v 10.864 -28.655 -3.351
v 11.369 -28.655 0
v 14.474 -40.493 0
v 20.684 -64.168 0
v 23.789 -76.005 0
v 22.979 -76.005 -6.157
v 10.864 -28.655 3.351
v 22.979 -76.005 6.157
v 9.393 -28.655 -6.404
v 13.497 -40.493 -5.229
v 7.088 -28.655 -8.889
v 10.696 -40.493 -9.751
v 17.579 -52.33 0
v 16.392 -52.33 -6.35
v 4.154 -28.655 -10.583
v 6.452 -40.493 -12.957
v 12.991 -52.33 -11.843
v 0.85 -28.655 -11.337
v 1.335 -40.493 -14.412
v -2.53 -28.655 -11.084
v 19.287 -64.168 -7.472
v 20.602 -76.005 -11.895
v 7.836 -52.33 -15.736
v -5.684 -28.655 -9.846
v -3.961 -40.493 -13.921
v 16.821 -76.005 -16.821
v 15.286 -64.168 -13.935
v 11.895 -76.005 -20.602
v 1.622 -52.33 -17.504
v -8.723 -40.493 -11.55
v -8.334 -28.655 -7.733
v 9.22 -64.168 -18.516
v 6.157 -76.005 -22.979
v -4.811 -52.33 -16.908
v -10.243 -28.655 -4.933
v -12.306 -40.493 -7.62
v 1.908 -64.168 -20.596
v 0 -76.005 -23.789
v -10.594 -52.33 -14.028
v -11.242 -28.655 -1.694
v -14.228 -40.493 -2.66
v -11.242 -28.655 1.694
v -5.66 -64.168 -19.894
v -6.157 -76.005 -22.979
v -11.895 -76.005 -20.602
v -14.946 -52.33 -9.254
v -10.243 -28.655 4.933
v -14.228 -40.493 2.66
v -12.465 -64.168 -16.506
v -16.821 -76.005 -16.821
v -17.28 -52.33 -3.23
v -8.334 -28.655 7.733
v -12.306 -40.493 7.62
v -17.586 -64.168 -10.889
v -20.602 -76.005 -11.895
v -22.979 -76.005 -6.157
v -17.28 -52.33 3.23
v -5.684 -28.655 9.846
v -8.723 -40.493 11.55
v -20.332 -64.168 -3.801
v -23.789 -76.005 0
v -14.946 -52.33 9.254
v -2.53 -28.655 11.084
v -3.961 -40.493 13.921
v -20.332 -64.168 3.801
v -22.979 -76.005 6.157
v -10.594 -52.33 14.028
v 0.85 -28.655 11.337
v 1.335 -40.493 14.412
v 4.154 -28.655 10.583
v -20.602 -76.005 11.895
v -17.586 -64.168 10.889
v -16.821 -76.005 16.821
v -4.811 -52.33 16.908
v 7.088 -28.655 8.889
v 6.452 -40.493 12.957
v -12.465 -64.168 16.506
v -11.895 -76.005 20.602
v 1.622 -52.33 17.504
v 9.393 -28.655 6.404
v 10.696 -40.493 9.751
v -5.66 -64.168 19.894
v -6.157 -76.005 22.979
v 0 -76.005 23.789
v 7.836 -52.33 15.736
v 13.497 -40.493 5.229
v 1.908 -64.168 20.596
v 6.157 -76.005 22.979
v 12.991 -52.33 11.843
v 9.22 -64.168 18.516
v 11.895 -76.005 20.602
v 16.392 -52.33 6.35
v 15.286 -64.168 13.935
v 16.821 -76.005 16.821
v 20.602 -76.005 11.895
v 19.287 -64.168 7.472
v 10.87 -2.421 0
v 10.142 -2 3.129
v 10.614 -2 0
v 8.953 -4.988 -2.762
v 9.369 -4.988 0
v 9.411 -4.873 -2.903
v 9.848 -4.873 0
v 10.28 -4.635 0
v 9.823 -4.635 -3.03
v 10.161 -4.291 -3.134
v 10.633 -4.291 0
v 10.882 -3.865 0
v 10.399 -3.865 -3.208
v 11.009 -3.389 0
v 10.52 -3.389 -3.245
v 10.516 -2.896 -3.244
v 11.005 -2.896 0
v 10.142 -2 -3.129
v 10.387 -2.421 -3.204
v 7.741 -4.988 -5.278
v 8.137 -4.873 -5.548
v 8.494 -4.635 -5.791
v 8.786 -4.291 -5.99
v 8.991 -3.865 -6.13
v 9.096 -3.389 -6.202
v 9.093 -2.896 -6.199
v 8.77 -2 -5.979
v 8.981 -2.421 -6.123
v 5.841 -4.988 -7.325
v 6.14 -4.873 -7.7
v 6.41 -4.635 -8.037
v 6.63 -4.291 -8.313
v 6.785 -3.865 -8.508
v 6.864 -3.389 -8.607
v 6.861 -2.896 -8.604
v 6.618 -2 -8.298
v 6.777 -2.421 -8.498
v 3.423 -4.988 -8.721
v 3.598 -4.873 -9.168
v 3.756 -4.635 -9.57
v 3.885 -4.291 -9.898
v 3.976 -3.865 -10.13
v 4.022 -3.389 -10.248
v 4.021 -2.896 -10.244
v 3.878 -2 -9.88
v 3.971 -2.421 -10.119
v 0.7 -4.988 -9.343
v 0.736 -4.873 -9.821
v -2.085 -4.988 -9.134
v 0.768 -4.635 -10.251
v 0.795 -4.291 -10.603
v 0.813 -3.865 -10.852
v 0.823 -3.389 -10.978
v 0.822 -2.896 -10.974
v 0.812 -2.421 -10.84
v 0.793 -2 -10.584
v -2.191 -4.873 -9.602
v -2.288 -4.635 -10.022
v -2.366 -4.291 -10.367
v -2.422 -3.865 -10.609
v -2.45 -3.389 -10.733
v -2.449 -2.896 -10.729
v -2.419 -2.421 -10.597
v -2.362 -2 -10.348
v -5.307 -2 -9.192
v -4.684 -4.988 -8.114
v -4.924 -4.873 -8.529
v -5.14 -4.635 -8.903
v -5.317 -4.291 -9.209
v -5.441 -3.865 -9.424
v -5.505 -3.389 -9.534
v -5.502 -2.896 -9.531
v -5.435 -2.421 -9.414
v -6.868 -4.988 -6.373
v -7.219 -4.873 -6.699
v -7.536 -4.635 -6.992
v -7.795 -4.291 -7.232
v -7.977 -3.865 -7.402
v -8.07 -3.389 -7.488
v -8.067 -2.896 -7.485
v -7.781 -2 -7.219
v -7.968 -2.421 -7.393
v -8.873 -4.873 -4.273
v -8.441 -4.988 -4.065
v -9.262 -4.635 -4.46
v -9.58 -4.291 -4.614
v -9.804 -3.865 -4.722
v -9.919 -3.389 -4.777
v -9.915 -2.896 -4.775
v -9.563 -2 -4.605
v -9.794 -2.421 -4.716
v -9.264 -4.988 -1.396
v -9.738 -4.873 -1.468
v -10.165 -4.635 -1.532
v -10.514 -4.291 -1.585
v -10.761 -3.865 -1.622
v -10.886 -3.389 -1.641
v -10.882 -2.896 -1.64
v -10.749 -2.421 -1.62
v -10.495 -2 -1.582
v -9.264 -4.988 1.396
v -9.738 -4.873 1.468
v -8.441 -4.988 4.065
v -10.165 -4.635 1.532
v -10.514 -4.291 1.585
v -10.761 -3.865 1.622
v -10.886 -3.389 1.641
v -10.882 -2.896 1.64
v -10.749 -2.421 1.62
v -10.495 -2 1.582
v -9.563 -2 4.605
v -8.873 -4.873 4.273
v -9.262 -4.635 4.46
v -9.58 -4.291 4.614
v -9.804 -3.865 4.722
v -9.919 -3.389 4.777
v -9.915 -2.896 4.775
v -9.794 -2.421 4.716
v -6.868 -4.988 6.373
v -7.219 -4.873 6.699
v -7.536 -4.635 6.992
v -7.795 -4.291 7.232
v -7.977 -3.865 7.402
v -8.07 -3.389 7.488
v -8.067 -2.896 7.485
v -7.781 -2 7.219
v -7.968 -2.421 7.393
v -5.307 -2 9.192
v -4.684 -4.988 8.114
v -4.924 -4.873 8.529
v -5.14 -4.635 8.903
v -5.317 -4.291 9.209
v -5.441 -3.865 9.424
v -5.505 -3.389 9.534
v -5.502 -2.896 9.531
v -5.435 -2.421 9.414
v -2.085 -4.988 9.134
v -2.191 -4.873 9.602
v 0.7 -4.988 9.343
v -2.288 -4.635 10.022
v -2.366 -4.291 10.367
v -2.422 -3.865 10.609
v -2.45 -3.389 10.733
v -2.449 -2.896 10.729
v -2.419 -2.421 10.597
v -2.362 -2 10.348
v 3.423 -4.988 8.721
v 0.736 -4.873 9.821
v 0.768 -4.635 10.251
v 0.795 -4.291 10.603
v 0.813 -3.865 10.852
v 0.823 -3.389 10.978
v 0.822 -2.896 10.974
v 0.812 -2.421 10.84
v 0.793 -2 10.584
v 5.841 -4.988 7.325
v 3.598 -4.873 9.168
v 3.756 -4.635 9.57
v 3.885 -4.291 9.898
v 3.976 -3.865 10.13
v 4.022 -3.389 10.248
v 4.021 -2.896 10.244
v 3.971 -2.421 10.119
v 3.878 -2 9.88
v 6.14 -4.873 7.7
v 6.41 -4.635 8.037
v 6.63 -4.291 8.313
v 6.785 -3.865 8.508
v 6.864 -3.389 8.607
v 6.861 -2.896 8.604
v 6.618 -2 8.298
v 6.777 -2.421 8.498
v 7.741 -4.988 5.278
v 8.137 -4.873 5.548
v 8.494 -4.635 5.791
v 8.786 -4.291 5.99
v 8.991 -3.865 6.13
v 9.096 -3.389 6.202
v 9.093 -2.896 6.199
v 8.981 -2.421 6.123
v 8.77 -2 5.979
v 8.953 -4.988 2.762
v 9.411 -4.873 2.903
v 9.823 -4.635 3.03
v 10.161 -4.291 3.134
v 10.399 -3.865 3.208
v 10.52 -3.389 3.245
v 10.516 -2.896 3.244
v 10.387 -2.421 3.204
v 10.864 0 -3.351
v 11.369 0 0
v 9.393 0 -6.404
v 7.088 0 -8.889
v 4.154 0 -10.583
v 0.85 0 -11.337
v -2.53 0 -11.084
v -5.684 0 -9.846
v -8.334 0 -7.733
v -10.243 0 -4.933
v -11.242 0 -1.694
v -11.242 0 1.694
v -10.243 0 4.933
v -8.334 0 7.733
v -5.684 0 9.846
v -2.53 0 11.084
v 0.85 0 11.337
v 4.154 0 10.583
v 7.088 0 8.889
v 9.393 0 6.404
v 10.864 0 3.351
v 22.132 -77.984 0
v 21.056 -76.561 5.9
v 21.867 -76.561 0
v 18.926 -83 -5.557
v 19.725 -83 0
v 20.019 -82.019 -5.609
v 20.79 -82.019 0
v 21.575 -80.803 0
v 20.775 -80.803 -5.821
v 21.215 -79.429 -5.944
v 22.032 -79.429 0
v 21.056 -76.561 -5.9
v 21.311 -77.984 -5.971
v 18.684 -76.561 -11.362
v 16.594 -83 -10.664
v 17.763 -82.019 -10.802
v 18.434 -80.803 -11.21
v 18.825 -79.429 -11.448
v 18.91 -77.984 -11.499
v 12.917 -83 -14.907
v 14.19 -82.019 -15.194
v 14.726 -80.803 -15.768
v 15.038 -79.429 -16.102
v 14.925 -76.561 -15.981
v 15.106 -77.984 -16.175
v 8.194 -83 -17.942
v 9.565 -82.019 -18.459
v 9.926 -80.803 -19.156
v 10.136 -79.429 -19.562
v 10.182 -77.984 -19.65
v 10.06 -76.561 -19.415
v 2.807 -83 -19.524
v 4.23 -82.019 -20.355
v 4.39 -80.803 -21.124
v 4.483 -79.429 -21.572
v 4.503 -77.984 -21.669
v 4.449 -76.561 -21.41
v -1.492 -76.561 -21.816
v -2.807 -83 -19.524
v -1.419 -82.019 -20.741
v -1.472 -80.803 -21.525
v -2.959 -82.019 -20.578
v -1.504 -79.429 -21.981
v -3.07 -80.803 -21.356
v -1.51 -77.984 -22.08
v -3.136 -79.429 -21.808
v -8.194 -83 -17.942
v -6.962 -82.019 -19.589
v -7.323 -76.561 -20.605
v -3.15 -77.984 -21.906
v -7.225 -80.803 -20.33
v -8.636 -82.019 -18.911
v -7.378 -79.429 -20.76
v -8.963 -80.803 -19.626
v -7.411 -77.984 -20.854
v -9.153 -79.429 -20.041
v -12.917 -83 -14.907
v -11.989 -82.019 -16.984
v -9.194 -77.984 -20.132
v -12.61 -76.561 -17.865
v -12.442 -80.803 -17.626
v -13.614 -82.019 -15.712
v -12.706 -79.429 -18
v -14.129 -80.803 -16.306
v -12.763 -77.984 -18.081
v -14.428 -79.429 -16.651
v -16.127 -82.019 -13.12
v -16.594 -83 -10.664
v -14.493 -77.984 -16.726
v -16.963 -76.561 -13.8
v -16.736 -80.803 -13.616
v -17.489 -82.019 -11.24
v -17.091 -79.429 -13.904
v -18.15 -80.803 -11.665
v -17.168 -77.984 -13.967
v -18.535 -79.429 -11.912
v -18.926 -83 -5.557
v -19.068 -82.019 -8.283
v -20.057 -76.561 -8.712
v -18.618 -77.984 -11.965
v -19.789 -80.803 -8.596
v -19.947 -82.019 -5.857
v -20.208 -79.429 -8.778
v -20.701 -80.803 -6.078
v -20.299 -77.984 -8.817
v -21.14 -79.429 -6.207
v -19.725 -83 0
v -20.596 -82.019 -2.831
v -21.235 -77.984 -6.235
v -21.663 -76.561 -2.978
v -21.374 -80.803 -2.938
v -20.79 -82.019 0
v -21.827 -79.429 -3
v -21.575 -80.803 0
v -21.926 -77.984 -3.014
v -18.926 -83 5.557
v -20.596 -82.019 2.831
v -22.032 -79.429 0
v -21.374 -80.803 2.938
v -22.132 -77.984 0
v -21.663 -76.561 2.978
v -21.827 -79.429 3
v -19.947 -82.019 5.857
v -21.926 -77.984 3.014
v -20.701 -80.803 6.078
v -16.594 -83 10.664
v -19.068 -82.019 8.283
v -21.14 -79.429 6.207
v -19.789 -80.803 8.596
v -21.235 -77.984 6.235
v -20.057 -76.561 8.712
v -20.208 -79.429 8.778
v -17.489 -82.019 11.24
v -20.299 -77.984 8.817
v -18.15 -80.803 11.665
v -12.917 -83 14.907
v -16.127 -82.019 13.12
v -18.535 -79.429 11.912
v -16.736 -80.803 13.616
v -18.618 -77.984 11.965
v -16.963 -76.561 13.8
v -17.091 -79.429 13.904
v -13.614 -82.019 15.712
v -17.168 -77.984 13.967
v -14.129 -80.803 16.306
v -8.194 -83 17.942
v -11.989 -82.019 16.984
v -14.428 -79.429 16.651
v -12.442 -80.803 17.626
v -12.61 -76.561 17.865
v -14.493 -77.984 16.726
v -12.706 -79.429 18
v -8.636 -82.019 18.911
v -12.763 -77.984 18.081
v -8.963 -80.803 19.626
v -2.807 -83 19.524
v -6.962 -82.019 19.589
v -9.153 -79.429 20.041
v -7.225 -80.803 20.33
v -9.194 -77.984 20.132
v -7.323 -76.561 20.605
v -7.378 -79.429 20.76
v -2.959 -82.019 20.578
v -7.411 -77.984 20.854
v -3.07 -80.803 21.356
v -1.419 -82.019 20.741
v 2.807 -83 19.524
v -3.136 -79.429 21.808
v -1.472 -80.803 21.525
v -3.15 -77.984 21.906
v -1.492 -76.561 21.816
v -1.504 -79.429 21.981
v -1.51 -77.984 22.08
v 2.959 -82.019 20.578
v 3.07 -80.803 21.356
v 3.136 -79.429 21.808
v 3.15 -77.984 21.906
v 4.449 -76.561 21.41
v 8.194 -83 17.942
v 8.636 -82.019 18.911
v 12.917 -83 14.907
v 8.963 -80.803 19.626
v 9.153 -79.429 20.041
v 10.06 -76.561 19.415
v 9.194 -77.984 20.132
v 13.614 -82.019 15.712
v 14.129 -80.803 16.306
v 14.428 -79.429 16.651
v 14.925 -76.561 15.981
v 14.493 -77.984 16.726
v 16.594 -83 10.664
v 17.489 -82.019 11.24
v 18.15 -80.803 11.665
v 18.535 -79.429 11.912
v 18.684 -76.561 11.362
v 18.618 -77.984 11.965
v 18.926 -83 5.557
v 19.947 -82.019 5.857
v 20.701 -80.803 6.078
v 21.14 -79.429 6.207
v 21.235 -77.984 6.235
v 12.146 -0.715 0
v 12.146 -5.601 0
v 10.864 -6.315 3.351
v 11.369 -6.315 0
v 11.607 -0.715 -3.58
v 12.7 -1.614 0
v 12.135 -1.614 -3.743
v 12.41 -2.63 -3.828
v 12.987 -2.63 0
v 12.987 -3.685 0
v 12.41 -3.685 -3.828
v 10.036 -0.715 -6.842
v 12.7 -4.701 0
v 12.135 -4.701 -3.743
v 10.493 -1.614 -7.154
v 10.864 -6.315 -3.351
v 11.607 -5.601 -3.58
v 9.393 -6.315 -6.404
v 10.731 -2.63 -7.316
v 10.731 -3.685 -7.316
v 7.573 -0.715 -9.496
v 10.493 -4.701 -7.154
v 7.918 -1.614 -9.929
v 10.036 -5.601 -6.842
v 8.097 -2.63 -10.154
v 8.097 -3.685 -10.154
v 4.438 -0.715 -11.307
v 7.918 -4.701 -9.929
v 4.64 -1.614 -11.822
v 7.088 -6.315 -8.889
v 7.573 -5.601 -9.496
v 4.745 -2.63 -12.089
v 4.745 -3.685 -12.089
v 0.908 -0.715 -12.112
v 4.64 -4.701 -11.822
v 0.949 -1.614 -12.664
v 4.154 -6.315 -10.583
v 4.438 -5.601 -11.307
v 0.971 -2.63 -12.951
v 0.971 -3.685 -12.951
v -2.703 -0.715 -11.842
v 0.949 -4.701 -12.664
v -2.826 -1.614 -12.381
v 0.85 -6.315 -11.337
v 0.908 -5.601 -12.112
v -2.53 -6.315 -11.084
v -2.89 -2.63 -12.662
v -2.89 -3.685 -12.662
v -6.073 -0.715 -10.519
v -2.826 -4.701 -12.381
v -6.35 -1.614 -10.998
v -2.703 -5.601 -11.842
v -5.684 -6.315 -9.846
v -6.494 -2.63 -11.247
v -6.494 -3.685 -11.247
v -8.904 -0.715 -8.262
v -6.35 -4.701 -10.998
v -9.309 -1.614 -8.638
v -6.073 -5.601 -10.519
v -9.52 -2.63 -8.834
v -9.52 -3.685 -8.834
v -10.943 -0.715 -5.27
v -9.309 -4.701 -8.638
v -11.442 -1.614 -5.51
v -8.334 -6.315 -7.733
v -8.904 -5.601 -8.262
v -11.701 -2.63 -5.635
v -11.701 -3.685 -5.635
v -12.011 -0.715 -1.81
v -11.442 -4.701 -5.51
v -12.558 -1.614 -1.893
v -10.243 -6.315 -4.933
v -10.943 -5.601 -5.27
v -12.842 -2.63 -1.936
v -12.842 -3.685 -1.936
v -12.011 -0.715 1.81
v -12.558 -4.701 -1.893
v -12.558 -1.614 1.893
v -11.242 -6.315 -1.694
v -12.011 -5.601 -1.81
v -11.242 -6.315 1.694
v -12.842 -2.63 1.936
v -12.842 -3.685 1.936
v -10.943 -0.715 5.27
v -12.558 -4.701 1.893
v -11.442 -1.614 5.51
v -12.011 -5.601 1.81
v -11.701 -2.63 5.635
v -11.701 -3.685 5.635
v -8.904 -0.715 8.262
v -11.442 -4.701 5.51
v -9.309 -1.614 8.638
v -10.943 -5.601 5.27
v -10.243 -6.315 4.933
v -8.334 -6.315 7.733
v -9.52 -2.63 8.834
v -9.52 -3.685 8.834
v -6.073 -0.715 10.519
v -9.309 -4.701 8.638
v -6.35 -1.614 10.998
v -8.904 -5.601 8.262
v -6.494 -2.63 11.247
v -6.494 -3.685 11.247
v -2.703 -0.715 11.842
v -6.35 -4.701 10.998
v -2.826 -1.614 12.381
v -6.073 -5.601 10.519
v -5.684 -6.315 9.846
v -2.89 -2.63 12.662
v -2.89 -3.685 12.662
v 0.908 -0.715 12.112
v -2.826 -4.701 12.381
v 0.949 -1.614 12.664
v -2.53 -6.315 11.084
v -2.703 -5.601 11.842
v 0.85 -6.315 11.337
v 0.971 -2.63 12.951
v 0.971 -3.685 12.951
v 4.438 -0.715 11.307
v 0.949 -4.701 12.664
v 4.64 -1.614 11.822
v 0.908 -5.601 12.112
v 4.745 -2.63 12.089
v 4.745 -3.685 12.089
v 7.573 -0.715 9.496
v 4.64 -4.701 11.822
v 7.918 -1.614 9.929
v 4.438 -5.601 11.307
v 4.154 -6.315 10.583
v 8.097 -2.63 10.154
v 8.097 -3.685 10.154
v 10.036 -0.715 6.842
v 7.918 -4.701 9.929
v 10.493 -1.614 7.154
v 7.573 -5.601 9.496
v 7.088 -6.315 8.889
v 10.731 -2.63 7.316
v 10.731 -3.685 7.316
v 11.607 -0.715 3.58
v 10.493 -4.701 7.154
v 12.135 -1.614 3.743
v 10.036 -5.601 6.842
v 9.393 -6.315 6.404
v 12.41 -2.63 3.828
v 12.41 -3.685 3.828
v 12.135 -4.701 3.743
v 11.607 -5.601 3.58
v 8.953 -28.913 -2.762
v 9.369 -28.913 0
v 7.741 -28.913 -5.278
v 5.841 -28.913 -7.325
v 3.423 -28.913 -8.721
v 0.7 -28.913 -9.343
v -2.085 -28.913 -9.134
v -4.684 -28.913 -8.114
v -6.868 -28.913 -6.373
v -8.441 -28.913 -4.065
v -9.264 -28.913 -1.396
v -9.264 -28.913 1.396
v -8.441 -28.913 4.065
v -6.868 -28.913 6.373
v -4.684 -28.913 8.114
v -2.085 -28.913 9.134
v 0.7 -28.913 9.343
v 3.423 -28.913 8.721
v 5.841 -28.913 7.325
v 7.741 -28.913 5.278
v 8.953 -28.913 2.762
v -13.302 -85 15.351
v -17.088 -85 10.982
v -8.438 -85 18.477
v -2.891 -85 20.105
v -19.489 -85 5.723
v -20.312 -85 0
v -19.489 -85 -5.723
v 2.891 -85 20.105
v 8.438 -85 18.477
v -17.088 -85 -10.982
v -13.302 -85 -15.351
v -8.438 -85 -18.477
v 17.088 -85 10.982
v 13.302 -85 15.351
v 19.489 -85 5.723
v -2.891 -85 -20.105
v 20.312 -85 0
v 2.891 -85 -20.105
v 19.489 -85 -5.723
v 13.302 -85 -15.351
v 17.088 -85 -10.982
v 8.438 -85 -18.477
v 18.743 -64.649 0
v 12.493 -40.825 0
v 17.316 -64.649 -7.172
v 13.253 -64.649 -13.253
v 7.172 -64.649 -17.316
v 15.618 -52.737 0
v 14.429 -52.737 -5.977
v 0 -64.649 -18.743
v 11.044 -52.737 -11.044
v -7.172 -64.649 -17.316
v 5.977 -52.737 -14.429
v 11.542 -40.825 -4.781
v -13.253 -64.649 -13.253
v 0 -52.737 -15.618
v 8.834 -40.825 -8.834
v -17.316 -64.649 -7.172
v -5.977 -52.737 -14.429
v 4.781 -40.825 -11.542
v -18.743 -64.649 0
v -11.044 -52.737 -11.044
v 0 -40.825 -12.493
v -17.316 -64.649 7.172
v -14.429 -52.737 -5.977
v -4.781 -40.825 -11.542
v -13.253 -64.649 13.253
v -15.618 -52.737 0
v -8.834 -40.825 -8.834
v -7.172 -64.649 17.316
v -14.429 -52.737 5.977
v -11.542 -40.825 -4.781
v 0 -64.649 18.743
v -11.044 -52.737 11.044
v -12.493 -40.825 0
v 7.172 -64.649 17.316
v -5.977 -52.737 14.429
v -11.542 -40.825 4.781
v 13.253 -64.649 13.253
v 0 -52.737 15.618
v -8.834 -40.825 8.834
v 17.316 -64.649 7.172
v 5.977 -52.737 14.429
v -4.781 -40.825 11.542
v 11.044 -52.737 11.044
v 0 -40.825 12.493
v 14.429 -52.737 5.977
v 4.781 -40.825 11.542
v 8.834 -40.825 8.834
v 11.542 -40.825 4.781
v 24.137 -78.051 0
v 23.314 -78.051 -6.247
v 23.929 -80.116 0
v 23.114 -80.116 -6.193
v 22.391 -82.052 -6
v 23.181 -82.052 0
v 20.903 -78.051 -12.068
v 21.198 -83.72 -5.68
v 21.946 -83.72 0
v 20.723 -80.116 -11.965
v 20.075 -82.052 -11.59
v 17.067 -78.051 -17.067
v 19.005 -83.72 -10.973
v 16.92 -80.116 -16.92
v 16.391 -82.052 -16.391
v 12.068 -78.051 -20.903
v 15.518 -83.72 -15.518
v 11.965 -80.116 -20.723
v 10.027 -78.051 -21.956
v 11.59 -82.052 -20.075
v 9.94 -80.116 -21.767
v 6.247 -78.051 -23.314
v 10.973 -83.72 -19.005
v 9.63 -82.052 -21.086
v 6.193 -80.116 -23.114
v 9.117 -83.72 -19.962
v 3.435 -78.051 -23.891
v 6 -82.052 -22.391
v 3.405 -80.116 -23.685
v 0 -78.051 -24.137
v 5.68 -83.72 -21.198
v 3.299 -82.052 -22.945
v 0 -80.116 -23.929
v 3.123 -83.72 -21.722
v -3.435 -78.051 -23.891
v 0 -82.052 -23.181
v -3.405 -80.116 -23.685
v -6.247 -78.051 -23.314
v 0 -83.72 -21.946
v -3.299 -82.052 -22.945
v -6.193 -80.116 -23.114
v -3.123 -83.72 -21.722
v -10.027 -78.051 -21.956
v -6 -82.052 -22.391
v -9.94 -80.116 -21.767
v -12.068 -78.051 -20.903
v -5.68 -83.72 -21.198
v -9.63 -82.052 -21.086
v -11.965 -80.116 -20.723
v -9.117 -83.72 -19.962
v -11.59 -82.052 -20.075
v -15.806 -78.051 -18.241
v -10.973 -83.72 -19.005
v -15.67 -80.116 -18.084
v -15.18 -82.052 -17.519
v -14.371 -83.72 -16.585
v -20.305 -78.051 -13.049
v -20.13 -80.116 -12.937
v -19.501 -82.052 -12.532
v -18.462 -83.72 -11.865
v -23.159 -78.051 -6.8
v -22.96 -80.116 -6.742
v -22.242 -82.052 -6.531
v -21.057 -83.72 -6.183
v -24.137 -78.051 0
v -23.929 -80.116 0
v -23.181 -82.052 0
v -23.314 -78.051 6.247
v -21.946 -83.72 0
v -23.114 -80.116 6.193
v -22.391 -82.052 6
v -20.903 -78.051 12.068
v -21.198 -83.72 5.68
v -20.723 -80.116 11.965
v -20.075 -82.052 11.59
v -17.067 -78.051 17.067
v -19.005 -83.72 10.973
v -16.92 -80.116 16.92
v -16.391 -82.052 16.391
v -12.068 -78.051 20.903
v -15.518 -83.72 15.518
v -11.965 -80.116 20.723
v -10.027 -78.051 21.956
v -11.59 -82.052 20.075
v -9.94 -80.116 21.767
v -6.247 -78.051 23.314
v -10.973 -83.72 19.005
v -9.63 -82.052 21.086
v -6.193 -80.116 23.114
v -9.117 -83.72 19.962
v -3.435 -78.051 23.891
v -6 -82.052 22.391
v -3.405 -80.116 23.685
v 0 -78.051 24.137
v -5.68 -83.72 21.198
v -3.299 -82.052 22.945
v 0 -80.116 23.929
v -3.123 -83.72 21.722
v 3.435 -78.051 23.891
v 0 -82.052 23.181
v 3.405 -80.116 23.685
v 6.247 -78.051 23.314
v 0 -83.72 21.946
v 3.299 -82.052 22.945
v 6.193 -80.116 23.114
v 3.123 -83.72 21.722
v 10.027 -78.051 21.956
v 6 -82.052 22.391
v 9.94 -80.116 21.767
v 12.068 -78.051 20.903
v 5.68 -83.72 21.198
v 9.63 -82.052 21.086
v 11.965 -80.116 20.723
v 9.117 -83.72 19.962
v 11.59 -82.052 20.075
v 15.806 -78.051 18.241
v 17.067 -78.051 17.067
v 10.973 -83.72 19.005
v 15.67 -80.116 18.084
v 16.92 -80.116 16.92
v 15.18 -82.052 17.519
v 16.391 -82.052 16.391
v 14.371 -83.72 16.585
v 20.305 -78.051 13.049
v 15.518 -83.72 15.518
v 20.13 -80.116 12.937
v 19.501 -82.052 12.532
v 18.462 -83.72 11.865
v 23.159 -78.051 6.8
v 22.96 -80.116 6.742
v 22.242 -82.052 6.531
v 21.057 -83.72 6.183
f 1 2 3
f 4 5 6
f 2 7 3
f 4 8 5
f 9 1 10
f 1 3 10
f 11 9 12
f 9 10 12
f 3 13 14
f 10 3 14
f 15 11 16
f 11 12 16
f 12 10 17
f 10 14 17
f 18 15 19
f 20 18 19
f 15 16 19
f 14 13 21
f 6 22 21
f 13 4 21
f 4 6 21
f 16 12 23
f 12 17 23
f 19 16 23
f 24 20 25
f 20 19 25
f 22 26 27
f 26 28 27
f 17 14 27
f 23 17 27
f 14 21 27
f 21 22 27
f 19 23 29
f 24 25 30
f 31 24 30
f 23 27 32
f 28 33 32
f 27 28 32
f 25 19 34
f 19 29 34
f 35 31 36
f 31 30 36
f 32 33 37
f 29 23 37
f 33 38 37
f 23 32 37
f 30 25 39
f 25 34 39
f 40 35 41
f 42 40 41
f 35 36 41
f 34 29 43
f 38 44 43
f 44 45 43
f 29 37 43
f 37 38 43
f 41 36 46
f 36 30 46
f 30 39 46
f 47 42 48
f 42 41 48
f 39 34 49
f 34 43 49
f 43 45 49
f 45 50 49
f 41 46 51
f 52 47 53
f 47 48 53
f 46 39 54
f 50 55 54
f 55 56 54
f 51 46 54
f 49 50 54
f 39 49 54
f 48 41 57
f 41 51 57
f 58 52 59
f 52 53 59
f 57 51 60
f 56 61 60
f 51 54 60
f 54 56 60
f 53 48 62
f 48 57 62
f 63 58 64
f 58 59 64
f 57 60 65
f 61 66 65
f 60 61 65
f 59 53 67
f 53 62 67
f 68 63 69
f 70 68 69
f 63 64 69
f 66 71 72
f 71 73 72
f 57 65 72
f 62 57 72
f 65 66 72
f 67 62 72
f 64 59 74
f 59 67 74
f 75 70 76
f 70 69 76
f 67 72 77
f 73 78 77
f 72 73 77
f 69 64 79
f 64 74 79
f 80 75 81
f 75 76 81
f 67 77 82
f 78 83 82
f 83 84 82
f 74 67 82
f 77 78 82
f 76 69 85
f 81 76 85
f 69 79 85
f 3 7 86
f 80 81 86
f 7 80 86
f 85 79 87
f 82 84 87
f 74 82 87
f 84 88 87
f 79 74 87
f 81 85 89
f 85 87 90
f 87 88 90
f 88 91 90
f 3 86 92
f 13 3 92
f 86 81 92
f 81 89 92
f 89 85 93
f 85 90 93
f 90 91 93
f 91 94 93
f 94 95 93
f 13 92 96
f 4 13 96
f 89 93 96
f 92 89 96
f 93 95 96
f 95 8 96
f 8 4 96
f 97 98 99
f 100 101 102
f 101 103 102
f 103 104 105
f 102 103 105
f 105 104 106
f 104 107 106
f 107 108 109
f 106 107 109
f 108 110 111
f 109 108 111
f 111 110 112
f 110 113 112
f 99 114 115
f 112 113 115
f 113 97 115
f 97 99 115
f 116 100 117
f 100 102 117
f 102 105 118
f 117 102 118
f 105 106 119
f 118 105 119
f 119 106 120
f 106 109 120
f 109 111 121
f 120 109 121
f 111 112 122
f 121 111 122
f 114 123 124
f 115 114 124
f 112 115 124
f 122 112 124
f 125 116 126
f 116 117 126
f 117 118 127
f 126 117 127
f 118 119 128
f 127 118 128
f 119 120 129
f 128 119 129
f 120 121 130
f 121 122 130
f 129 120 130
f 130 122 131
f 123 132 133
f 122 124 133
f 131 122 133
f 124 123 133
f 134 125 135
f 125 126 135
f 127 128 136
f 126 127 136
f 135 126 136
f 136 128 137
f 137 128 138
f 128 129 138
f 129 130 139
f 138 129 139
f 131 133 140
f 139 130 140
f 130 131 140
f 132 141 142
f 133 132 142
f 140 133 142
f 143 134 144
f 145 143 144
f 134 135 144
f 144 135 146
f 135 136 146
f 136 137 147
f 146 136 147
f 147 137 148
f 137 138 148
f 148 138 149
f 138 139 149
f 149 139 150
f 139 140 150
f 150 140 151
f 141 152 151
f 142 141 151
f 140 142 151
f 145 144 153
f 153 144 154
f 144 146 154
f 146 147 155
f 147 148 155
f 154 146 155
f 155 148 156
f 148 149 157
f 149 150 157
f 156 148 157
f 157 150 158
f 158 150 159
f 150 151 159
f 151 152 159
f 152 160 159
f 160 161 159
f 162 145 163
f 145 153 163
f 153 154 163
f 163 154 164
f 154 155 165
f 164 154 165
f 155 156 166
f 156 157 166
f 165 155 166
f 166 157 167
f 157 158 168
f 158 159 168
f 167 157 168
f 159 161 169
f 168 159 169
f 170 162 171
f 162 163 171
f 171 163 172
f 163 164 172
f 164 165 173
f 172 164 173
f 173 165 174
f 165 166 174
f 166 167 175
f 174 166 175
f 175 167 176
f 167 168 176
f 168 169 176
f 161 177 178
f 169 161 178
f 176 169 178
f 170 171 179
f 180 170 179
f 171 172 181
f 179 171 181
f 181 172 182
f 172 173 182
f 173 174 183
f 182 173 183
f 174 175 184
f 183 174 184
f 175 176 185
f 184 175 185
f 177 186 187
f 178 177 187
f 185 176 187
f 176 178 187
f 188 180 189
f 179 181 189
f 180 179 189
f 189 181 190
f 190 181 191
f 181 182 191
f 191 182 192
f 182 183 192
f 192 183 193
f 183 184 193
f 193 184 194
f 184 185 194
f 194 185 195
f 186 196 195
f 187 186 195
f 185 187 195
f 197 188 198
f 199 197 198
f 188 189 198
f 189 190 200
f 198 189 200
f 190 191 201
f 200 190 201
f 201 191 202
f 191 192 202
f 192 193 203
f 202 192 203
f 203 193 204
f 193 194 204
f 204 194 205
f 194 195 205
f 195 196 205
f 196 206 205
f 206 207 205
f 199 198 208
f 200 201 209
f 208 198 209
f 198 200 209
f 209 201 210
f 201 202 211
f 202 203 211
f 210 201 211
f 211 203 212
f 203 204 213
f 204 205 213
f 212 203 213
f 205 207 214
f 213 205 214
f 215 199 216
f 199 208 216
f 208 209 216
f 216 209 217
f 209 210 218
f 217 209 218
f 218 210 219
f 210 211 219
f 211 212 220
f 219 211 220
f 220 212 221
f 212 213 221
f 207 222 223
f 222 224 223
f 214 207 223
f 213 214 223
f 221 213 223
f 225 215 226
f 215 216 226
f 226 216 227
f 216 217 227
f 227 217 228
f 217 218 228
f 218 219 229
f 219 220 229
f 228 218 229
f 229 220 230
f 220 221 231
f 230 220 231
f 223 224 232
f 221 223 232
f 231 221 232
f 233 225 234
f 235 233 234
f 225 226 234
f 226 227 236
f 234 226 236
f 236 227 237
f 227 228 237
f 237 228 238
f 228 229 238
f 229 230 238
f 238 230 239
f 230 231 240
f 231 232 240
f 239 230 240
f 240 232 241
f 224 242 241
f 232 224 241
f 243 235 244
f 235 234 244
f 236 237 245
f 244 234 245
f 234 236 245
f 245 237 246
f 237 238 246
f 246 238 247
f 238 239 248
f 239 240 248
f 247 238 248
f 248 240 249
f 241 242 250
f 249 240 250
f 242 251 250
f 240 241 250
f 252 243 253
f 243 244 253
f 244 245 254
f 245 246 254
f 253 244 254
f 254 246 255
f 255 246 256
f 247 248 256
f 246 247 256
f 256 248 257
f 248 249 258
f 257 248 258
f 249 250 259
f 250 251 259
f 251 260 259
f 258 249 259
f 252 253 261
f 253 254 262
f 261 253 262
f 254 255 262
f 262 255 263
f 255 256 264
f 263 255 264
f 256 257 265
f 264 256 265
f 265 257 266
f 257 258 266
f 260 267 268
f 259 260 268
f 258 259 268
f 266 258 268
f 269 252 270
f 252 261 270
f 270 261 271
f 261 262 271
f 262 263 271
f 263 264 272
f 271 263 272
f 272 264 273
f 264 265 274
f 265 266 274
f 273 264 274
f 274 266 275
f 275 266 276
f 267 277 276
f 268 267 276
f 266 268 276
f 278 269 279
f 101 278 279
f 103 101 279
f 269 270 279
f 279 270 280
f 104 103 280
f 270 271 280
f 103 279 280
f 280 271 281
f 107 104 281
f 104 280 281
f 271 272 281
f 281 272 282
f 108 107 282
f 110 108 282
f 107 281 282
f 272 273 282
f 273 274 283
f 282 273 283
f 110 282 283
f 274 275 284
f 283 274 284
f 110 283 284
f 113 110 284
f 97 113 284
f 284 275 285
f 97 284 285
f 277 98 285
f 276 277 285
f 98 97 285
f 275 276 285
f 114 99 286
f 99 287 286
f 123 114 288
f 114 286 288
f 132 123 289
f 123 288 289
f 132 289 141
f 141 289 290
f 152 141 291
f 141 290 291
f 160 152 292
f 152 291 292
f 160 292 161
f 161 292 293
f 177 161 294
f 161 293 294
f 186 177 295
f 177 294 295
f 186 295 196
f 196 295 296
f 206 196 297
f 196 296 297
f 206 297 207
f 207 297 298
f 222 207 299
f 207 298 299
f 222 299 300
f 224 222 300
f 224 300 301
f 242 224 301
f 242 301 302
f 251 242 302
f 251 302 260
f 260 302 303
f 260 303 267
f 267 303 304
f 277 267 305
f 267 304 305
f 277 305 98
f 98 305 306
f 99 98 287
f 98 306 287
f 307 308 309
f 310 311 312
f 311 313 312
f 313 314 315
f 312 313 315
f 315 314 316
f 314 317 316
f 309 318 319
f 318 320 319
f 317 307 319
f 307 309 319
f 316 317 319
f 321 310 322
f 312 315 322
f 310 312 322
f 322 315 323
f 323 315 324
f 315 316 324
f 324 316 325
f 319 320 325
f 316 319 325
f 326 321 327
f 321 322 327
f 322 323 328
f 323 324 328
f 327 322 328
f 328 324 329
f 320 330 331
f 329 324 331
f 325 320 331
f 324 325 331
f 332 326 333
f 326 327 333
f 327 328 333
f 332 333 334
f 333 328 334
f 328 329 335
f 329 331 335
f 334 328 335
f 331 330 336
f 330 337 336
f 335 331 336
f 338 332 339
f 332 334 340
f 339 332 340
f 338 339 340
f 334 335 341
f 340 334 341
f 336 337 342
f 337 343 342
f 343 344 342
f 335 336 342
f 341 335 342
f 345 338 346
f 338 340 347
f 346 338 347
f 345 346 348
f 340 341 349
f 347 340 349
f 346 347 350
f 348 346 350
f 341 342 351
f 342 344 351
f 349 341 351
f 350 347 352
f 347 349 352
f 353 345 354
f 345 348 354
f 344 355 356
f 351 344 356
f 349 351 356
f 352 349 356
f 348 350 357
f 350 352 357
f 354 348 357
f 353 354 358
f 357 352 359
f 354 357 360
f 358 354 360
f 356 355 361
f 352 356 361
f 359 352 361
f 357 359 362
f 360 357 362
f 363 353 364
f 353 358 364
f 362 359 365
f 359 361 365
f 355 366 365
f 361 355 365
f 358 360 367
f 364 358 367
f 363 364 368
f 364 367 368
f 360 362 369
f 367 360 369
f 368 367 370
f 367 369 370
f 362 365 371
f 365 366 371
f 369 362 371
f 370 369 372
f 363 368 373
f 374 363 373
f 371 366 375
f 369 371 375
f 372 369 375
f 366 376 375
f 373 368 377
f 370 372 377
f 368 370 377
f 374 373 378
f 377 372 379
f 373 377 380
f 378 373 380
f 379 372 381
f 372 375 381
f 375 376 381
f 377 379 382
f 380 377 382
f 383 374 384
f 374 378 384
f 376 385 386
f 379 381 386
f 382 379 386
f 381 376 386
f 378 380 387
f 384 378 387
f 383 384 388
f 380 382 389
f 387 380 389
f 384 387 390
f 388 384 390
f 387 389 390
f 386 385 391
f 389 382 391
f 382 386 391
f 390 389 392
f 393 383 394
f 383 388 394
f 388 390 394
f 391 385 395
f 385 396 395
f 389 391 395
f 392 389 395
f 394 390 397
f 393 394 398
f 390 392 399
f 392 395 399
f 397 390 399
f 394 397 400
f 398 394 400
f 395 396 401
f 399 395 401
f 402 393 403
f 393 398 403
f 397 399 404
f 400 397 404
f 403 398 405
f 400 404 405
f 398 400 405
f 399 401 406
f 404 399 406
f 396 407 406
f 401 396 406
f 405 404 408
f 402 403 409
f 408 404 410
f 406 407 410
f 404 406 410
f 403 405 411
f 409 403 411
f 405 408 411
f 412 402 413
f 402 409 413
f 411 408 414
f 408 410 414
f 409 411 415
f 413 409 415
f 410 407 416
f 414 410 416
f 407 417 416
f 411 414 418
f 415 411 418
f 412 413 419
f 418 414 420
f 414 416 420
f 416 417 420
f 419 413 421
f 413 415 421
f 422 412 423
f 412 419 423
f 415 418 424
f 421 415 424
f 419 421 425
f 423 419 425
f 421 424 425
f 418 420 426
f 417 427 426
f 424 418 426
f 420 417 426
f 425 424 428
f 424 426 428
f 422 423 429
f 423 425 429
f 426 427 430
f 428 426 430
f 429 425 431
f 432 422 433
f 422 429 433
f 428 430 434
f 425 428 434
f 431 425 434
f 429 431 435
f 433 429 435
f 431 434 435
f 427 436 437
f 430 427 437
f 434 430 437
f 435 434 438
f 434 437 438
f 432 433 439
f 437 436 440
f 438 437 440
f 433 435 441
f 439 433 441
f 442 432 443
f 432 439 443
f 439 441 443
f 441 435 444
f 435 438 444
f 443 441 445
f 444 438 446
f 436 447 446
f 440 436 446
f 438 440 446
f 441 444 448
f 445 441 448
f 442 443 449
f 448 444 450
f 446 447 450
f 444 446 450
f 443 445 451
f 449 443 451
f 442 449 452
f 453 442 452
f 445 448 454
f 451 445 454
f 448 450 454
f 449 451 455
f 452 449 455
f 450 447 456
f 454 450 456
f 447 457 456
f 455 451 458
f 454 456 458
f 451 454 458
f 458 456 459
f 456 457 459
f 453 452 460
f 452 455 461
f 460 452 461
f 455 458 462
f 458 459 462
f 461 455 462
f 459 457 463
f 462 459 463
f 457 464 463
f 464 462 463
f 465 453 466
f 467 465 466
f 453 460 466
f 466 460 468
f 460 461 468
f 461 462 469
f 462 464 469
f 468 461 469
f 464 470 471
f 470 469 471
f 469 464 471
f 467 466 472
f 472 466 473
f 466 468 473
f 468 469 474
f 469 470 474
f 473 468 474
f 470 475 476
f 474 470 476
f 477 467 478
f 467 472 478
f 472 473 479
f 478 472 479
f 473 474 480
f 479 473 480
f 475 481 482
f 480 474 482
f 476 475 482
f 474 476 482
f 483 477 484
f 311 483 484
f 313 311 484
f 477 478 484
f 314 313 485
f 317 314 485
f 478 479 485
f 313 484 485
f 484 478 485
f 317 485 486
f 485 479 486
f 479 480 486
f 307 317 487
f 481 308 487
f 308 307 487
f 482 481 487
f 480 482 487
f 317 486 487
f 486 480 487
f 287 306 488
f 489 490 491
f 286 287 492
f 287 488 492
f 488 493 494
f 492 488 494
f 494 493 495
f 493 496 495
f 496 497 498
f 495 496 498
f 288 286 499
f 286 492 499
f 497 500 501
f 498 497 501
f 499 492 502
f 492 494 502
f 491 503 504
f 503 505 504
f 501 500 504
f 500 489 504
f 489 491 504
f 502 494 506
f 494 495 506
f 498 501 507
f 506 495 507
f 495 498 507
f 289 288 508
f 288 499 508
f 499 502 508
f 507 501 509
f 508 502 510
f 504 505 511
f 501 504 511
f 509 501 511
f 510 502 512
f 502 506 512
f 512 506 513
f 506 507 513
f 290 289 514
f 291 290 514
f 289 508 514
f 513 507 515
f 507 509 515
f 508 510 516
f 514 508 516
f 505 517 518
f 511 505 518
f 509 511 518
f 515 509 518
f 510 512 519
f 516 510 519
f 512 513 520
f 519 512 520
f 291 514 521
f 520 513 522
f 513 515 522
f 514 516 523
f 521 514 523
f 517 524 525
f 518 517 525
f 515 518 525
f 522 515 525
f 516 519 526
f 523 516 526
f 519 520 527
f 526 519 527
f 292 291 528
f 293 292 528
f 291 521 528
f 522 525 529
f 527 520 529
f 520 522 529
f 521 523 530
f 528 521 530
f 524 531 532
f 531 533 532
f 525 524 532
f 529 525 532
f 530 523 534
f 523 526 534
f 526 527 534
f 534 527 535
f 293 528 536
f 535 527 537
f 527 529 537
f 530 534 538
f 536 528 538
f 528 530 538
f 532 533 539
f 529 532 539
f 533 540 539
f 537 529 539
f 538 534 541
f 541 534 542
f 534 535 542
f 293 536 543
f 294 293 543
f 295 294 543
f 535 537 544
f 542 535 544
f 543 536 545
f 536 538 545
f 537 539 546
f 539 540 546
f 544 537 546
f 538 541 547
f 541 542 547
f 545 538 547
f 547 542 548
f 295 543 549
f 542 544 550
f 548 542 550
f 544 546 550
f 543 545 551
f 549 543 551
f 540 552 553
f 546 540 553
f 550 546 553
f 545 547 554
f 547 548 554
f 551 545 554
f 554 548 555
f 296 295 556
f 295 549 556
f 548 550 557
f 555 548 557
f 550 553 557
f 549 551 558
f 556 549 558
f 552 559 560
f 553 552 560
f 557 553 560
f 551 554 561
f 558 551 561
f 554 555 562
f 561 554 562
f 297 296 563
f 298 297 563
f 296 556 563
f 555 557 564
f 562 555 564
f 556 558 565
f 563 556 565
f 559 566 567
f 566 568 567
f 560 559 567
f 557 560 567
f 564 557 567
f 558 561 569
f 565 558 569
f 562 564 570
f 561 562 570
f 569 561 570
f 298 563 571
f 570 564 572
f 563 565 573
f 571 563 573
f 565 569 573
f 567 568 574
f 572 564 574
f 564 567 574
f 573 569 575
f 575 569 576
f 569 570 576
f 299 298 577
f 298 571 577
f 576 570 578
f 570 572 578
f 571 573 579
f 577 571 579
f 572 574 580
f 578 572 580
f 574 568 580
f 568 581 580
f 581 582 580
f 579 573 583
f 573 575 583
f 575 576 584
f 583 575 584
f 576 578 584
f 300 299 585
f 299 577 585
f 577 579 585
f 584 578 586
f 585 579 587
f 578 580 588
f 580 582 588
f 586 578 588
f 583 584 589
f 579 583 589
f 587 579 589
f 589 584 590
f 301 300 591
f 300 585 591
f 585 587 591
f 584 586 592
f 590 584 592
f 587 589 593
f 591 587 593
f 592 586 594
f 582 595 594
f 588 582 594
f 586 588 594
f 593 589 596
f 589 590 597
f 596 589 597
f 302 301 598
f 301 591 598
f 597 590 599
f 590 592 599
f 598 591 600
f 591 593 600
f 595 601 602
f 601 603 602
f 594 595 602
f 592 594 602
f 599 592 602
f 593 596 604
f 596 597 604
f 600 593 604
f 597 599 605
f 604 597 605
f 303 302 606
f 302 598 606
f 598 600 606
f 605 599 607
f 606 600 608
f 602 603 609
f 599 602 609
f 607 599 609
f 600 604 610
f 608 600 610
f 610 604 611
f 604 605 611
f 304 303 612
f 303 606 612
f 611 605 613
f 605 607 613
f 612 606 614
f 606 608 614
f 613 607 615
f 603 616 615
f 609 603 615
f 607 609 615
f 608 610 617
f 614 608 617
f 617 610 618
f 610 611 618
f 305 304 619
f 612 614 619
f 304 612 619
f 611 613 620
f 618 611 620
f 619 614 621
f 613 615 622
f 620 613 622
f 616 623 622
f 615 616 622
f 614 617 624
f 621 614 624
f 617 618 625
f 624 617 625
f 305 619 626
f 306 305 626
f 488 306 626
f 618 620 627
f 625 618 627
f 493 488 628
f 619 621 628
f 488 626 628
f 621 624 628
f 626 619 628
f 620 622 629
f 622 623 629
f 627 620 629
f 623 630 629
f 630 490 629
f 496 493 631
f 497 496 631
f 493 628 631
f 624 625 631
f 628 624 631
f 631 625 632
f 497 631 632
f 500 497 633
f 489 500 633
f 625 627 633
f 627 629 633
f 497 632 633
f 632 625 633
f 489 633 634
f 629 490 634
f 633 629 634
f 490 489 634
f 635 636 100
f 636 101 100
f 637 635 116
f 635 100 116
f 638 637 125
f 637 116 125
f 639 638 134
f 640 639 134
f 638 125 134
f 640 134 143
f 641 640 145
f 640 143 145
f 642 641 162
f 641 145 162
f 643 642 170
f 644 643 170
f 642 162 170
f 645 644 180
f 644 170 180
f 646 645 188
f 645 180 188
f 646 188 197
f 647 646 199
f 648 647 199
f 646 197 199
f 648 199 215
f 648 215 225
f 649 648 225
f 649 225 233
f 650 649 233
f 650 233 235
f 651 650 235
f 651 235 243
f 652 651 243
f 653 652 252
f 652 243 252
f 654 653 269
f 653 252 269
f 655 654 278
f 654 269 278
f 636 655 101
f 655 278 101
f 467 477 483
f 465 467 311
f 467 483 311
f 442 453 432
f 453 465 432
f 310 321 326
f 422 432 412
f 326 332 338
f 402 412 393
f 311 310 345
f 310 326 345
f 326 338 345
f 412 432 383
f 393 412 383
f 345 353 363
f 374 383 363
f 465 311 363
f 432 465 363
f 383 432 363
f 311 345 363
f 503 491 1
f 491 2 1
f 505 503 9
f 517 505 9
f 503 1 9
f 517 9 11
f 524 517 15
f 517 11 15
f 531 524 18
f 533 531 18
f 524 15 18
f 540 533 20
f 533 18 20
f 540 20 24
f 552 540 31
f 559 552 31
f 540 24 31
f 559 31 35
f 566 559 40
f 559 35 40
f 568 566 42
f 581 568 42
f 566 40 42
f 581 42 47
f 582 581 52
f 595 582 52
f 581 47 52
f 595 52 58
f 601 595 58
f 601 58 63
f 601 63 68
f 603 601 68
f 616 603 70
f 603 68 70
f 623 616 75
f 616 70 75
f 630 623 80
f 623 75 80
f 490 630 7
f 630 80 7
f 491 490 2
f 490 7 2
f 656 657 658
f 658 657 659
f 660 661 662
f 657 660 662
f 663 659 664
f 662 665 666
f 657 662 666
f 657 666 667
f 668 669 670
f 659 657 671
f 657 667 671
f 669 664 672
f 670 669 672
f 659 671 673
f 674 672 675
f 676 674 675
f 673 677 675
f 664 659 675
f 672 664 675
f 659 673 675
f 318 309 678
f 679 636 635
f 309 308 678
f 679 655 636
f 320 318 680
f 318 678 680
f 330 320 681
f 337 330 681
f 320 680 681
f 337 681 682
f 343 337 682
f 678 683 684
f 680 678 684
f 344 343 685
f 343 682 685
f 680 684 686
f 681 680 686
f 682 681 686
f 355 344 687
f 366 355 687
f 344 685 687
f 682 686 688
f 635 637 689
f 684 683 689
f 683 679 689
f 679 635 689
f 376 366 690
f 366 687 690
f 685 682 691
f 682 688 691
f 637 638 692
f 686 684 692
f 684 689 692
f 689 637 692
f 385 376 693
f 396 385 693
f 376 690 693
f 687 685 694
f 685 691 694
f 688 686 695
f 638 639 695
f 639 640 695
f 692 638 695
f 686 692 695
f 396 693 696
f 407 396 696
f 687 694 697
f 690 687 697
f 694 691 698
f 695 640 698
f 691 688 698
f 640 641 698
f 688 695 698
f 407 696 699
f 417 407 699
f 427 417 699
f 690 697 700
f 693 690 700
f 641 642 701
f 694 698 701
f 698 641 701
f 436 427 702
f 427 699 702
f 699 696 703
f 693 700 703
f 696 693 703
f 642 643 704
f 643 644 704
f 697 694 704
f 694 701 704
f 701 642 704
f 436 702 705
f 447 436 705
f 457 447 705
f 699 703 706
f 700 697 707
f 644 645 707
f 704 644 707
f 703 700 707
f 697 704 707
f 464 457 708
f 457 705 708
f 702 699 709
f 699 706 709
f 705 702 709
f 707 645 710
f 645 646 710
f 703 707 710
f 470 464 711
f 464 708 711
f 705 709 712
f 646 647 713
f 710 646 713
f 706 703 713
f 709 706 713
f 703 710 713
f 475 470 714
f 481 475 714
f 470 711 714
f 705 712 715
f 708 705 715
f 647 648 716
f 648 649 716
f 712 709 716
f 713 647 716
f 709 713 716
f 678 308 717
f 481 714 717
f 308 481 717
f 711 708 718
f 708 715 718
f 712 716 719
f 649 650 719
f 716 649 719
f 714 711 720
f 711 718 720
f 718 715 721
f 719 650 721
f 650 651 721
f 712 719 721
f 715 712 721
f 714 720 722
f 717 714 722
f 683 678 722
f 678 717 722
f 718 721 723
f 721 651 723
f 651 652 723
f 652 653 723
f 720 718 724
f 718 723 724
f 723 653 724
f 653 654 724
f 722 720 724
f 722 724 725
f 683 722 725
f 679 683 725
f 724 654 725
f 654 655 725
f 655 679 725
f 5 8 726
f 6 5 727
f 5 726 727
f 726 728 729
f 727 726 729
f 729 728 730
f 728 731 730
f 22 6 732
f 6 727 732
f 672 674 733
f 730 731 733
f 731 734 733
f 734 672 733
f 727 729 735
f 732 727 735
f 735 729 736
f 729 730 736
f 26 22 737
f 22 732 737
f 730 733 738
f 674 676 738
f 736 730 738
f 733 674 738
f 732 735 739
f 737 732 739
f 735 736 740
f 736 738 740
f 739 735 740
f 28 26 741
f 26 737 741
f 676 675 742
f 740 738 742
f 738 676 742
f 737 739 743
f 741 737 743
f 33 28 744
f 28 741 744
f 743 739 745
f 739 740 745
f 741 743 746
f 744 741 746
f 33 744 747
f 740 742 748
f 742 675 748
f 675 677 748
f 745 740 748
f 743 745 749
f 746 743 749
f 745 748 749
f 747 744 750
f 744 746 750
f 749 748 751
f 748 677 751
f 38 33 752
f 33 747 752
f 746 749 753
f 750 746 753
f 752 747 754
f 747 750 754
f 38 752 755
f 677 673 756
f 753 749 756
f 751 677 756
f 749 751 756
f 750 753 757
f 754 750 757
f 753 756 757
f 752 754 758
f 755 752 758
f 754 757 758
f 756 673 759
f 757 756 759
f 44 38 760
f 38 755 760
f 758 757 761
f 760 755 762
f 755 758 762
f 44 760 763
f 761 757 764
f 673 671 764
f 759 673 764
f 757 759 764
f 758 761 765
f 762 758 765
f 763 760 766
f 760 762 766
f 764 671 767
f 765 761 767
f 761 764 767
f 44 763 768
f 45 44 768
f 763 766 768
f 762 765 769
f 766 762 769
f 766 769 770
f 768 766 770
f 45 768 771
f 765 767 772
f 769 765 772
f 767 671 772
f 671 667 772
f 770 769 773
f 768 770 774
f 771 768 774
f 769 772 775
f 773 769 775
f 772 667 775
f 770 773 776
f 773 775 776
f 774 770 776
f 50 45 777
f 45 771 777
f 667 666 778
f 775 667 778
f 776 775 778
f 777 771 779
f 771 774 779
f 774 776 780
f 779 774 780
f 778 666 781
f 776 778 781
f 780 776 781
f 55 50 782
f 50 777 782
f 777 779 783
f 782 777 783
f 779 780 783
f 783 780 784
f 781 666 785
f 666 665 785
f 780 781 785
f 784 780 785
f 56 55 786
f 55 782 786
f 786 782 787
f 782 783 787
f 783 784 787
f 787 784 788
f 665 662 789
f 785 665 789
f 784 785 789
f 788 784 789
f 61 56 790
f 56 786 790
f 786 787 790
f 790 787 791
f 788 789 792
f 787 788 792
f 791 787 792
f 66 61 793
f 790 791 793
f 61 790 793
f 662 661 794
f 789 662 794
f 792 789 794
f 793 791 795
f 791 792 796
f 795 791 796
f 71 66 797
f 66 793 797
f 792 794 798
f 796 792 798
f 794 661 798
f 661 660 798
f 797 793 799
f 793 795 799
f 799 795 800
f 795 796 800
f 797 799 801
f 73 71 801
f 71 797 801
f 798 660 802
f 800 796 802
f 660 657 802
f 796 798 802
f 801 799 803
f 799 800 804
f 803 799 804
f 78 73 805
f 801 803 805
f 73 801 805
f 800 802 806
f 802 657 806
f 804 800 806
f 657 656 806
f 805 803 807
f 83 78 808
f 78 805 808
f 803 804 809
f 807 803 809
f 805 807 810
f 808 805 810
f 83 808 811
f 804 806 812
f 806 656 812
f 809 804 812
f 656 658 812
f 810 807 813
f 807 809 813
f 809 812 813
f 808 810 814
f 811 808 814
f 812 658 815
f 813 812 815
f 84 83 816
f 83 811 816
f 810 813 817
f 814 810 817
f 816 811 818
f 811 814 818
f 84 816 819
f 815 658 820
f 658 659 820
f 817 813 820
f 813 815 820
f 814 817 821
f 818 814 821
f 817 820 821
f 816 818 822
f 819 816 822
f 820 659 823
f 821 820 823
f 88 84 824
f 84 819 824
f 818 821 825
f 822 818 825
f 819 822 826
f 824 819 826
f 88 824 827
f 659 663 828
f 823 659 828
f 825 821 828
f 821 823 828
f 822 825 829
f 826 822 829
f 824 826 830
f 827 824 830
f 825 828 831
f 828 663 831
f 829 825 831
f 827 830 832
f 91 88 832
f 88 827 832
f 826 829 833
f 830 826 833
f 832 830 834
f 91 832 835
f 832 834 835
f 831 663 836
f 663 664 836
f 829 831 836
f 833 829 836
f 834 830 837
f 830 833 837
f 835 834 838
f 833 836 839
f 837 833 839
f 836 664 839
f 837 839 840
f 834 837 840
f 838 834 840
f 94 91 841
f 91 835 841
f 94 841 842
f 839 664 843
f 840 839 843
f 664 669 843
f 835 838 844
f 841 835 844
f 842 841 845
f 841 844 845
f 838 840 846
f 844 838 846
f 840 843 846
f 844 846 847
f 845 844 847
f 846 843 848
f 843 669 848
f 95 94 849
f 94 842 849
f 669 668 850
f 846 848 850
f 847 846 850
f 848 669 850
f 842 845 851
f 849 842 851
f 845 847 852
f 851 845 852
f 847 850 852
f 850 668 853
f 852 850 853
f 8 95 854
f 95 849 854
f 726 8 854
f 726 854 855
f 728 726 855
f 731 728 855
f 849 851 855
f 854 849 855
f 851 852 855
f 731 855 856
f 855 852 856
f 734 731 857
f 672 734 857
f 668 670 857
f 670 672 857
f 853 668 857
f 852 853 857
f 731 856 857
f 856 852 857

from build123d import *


with BuildPart() as part:
    # Sketch1 → Revolve1 (revolve)
    with BuildSketch(Plane.XY):
        with BuildLine():
            Line((11.36894359, -6.315125633), (11.36894359, -28.655158183))
            Line((11.36894359, -28.655158183), (23.78910836, -76.005260823))
            ThreePointArc((23.78910836, -76.005260823), (23.619975063, -81.109245479), (20.312212269, -85))
            Line((20.312212269, -85), (0, -85))
            Line((0, -85), (0, -83))
            Line((0, -83), (2, -83))
            Line((2, -83), (19.724958515, -83))
            ThreePointArc((19.724958515, -83), (21.847263271, -80.130008508), (21.867118705, -76.560605981))
            Line((21.867118705, -76.560605981), (9.36894359, -28.913100051))
            Line((9.36894359, -28.913100051), (9.36894359, -4.98823705))
            ThreePointArc((9.36894359, -4.98823705), (10.882135633, -3.865208891), (10.61392266, -2))
            Line((10.61392266, -2), (11.36894359, 0))
            ThreePointArc((11.36894359, 0), (13.023652288, -3.157562817), (11.36894359, -6.315125633))
        make_face()
    revolve(axis=Axis((0, -85, 0), (0, 1, 0)))


solid = part.part
